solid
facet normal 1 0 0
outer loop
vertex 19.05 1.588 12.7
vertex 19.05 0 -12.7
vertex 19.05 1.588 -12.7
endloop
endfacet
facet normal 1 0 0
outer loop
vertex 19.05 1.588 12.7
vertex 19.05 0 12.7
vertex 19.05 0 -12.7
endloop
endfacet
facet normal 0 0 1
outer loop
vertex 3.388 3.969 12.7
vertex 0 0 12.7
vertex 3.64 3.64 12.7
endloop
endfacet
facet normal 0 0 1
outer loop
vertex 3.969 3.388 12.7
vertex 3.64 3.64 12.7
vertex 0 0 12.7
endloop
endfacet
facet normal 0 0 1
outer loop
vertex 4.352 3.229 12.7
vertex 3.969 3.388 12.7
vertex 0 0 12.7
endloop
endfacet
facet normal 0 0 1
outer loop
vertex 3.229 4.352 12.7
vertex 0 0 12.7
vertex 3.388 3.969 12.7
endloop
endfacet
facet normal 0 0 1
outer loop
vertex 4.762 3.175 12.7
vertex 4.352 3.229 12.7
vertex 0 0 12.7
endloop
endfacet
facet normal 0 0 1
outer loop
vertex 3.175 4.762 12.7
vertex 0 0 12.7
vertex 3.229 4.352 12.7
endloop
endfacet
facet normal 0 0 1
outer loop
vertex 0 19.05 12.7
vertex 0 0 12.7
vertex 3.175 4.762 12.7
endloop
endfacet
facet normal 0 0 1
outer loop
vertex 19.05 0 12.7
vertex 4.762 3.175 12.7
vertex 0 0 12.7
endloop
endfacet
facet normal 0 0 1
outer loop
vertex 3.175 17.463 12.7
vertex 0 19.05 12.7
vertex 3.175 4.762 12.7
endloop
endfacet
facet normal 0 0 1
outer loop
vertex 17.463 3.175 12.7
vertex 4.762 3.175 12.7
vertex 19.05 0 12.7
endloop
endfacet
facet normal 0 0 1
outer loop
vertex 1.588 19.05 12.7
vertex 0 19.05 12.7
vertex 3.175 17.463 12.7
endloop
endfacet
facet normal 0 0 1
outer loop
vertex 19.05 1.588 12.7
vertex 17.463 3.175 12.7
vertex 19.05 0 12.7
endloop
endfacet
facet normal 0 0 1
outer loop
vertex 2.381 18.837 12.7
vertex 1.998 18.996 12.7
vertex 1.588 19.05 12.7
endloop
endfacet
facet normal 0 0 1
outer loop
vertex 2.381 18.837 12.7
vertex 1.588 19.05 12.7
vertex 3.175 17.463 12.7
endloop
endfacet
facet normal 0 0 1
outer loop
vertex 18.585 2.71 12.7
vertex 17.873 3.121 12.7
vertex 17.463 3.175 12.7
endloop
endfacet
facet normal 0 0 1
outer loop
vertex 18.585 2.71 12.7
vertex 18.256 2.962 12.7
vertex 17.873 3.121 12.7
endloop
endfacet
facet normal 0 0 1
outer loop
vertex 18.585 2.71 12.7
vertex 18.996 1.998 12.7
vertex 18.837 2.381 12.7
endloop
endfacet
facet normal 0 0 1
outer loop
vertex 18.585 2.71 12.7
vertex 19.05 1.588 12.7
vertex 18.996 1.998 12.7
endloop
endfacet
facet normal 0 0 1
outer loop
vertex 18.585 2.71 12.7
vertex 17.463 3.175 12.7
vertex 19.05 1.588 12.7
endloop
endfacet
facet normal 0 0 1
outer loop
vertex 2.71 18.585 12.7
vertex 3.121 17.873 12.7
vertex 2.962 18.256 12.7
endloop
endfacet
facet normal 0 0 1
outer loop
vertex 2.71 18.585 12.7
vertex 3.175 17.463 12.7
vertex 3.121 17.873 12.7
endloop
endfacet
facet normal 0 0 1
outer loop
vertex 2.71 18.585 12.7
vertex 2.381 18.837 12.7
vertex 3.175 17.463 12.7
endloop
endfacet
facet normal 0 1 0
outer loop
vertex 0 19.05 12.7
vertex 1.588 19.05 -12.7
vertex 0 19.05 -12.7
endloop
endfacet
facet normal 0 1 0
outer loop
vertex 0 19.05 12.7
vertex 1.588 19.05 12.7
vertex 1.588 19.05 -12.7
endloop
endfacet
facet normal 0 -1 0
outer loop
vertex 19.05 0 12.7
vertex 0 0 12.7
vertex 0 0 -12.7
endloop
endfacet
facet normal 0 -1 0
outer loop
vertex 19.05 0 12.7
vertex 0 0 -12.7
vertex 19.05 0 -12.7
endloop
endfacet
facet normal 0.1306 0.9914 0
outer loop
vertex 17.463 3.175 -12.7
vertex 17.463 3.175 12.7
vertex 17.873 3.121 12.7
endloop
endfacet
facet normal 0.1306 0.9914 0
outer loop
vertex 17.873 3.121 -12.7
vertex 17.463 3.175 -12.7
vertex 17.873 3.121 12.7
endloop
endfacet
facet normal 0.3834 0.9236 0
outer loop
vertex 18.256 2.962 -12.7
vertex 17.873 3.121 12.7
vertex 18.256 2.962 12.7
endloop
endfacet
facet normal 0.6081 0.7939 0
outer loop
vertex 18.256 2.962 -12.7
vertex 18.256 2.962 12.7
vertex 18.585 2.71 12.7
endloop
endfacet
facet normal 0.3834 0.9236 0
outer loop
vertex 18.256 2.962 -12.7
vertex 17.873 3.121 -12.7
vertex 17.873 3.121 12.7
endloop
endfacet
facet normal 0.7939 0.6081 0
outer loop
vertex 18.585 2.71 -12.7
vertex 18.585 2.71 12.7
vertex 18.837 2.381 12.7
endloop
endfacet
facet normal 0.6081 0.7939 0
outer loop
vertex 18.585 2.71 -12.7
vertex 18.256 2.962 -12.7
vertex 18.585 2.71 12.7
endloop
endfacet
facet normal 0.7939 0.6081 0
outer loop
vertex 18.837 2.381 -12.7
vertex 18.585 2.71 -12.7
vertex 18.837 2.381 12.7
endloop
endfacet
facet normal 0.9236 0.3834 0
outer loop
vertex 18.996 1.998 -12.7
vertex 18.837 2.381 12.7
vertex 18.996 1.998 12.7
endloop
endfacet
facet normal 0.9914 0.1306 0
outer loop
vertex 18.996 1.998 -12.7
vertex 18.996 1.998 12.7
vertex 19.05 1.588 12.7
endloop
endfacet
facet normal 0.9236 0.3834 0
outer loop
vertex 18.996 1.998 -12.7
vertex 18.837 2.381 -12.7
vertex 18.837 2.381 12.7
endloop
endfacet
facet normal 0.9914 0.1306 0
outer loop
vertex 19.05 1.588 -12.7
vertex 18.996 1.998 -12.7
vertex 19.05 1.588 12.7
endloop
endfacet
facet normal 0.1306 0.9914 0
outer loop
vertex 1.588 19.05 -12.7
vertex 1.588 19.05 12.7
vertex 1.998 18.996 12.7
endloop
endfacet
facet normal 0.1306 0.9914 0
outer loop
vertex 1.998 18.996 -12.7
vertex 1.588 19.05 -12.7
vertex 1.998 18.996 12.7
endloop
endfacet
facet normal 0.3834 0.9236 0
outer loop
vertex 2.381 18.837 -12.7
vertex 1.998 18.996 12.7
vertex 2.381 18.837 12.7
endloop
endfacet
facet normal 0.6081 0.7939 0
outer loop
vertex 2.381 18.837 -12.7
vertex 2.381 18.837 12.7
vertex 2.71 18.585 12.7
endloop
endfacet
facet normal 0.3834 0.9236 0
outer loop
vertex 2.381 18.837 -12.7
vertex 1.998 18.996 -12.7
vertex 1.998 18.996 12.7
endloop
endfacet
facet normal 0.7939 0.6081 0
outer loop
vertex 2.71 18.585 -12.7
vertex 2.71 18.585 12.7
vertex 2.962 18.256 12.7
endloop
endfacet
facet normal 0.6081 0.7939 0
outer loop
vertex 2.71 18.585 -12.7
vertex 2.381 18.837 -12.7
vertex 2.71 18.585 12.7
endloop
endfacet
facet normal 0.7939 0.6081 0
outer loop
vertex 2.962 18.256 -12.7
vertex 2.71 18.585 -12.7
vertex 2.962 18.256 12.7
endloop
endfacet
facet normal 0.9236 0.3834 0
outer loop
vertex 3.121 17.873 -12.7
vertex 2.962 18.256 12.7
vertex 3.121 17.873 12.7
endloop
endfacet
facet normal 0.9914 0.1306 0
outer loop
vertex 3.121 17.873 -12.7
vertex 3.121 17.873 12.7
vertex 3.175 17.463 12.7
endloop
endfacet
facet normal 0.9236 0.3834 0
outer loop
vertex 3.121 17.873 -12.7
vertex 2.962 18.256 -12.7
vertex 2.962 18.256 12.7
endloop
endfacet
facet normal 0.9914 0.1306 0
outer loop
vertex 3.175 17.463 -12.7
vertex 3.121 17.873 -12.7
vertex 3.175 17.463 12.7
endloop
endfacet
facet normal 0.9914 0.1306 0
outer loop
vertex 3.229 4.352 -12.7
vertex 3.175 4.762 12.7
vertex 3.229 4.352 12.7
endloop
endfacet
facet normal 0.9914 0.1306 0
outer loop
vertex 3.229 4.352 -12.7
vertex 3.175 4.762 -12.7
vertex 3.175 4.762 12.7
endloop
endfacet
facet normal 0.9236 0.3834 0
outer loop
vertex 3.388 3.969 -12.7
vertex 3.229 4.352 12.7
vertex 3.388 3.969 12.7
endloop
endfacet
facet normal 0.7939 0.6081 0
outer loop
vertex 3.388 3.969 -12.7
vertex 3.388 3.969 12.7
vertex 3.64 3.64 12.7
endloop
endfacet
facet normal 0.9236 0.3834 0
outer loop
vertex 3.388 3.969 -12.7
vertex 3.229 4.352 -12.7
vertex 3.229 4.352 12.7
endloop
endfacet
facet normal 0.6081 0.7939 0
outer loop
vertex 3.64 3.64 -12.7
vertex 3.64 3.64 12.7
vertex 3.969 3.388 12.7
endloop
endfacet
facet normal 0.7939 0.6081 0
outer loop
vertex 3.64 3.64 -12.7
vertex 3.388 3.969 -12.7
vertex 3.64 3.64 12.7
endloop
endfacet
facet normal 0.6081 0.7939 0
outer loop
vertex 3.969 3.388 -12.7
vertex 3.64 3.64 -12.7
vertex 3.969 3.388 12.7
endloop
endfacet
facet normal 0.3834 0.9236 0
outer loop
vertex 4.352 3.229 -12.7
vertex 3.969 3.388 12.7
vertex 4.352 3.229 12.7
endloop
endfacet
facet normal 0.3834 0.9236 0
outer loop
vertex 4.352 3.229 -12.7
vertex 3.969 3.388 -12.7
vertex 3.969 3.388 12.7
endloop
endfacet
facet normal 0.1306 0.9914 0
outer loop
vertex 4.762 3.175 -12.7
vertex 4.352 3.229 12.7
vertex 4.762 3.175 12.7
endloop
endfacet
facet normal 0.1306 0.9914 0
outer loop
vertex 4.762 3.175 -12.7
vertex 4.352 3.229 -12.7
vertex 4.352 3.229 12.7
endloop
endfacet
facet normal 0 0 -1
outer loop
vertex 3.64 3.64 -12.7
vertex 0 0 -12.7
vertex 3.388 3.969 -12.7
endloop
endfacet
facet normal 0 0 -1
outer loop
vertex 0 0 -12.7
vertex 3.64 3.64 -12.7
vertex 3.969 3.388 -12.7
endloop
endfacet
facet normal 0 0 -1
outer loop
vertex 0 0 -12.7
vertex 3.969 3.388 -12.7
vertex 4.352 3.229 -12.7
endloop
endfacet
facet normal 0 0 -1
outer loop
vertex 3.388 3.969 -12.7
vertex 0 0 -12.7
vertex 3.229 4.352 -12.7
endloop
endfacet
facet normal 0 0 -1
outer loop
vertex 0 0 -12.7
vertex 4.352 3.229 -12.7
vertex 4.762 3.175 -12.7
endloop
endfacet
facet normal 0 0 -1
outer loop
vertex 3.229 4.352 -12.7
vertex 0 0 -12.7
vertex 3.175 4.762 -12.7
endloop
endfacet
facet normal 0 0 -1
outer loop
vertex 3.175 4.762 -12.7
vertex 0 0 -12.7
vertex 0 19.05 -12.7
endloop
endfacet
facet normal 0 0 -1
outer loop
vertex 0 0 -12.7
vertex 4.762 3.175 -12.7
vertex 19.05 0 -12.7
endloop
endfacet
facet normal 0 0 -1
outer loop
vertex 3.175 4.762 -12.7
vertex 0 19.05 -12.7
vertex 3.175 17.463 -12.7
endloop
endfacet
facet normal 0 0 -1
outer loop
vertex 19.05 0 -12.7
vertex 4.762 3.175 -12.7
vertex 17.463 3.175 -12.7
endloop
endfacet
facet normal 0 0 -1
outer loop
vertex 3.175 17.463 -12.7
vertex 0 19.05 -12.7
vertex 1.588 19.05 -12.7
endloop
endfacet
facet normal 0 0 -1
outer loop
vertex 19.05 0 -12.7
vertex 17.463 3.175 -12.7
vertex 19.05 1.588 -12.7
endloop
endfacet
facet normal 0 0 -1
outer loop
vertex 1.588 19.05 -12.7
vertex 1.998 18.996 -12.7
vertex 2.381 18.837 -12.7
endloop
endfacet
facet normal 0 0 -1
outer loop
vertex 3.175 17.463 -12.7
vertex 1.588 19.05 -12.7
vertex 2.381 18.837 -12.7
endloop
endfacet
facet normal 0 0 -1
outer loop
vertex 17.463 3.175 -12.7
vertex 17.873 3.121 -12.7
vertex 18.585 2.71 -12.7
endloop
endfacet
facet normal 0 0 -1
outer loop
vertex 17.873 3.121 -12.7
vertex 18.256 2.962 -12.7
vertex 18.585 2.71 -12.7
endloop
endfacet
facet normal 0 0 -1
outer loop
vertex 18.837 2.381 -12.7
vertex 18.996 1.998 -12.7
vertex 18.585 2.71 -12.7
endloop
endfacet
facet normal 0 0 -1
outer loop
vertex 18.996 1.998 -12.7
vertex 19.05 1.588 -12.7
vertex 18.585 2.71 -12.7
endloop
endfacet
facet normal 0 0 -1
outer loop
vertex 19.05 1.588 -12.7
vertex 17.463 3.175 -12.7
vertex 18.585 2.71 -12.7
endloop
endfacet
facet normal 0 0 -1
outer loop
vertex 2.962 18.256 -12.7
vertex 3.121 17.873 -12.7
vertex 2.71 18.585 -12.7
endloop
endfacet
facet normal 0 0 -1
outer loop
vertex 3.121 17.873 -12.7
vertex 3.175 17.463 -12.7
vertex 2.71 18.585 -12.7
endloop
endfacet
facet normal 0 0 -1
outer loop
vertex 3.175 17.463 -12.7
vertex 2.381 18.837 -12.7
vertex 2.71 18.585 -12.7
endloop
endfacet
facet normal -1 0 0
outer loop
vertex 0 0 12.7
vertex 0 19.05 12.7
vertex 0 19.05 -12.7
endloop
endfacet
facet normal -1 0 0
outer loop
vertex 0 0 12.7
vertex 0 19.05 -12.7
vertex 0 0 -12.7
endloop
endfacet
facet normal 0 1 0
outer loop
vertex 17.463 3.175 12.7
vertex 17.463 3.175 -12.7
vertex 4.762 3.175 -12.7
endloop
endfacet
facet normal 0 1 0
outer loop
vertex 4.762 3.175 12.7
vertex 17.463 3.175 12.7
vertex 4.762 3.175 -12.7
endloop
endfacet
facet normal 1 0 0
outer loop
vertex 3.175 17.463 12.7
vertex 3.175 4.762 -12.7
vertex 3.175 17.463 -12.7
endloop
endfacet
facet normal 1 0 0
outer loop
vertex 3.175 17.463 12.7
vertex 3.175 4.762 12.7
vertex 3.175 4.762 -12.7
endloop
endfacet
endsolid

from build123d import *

# Parameters (mm, degrees)
BOSS_EXTRUDE1_DEPTH = 12.7
FILLET1_R           = 1.5875


with BuildPart() as part:
    # Sketch3 → Boss-Extrude1 (new, symmetric)
    with BuildSketch(Plane.XY):
        Polygon((3.175, 19.05), (0, 19.05), (0, 0), (19.05, 0), (19.05, 3.175), (3.175, 3.175), align=None)
    extrude(amount=BOSS_EXTRUDE1_DEPTH, both=True)

    # Fillet1
    fillet1_edges = [part.edges().sort_by_distance(p)[0] for p in [
        (3.175, 3.175, 0),
        (19.05, 3.175, 0),
        (3.175, 19.05, 0),
    ]]
    fillet(fillet1_edges, radius=FILLET1_R)


solid = part.part
